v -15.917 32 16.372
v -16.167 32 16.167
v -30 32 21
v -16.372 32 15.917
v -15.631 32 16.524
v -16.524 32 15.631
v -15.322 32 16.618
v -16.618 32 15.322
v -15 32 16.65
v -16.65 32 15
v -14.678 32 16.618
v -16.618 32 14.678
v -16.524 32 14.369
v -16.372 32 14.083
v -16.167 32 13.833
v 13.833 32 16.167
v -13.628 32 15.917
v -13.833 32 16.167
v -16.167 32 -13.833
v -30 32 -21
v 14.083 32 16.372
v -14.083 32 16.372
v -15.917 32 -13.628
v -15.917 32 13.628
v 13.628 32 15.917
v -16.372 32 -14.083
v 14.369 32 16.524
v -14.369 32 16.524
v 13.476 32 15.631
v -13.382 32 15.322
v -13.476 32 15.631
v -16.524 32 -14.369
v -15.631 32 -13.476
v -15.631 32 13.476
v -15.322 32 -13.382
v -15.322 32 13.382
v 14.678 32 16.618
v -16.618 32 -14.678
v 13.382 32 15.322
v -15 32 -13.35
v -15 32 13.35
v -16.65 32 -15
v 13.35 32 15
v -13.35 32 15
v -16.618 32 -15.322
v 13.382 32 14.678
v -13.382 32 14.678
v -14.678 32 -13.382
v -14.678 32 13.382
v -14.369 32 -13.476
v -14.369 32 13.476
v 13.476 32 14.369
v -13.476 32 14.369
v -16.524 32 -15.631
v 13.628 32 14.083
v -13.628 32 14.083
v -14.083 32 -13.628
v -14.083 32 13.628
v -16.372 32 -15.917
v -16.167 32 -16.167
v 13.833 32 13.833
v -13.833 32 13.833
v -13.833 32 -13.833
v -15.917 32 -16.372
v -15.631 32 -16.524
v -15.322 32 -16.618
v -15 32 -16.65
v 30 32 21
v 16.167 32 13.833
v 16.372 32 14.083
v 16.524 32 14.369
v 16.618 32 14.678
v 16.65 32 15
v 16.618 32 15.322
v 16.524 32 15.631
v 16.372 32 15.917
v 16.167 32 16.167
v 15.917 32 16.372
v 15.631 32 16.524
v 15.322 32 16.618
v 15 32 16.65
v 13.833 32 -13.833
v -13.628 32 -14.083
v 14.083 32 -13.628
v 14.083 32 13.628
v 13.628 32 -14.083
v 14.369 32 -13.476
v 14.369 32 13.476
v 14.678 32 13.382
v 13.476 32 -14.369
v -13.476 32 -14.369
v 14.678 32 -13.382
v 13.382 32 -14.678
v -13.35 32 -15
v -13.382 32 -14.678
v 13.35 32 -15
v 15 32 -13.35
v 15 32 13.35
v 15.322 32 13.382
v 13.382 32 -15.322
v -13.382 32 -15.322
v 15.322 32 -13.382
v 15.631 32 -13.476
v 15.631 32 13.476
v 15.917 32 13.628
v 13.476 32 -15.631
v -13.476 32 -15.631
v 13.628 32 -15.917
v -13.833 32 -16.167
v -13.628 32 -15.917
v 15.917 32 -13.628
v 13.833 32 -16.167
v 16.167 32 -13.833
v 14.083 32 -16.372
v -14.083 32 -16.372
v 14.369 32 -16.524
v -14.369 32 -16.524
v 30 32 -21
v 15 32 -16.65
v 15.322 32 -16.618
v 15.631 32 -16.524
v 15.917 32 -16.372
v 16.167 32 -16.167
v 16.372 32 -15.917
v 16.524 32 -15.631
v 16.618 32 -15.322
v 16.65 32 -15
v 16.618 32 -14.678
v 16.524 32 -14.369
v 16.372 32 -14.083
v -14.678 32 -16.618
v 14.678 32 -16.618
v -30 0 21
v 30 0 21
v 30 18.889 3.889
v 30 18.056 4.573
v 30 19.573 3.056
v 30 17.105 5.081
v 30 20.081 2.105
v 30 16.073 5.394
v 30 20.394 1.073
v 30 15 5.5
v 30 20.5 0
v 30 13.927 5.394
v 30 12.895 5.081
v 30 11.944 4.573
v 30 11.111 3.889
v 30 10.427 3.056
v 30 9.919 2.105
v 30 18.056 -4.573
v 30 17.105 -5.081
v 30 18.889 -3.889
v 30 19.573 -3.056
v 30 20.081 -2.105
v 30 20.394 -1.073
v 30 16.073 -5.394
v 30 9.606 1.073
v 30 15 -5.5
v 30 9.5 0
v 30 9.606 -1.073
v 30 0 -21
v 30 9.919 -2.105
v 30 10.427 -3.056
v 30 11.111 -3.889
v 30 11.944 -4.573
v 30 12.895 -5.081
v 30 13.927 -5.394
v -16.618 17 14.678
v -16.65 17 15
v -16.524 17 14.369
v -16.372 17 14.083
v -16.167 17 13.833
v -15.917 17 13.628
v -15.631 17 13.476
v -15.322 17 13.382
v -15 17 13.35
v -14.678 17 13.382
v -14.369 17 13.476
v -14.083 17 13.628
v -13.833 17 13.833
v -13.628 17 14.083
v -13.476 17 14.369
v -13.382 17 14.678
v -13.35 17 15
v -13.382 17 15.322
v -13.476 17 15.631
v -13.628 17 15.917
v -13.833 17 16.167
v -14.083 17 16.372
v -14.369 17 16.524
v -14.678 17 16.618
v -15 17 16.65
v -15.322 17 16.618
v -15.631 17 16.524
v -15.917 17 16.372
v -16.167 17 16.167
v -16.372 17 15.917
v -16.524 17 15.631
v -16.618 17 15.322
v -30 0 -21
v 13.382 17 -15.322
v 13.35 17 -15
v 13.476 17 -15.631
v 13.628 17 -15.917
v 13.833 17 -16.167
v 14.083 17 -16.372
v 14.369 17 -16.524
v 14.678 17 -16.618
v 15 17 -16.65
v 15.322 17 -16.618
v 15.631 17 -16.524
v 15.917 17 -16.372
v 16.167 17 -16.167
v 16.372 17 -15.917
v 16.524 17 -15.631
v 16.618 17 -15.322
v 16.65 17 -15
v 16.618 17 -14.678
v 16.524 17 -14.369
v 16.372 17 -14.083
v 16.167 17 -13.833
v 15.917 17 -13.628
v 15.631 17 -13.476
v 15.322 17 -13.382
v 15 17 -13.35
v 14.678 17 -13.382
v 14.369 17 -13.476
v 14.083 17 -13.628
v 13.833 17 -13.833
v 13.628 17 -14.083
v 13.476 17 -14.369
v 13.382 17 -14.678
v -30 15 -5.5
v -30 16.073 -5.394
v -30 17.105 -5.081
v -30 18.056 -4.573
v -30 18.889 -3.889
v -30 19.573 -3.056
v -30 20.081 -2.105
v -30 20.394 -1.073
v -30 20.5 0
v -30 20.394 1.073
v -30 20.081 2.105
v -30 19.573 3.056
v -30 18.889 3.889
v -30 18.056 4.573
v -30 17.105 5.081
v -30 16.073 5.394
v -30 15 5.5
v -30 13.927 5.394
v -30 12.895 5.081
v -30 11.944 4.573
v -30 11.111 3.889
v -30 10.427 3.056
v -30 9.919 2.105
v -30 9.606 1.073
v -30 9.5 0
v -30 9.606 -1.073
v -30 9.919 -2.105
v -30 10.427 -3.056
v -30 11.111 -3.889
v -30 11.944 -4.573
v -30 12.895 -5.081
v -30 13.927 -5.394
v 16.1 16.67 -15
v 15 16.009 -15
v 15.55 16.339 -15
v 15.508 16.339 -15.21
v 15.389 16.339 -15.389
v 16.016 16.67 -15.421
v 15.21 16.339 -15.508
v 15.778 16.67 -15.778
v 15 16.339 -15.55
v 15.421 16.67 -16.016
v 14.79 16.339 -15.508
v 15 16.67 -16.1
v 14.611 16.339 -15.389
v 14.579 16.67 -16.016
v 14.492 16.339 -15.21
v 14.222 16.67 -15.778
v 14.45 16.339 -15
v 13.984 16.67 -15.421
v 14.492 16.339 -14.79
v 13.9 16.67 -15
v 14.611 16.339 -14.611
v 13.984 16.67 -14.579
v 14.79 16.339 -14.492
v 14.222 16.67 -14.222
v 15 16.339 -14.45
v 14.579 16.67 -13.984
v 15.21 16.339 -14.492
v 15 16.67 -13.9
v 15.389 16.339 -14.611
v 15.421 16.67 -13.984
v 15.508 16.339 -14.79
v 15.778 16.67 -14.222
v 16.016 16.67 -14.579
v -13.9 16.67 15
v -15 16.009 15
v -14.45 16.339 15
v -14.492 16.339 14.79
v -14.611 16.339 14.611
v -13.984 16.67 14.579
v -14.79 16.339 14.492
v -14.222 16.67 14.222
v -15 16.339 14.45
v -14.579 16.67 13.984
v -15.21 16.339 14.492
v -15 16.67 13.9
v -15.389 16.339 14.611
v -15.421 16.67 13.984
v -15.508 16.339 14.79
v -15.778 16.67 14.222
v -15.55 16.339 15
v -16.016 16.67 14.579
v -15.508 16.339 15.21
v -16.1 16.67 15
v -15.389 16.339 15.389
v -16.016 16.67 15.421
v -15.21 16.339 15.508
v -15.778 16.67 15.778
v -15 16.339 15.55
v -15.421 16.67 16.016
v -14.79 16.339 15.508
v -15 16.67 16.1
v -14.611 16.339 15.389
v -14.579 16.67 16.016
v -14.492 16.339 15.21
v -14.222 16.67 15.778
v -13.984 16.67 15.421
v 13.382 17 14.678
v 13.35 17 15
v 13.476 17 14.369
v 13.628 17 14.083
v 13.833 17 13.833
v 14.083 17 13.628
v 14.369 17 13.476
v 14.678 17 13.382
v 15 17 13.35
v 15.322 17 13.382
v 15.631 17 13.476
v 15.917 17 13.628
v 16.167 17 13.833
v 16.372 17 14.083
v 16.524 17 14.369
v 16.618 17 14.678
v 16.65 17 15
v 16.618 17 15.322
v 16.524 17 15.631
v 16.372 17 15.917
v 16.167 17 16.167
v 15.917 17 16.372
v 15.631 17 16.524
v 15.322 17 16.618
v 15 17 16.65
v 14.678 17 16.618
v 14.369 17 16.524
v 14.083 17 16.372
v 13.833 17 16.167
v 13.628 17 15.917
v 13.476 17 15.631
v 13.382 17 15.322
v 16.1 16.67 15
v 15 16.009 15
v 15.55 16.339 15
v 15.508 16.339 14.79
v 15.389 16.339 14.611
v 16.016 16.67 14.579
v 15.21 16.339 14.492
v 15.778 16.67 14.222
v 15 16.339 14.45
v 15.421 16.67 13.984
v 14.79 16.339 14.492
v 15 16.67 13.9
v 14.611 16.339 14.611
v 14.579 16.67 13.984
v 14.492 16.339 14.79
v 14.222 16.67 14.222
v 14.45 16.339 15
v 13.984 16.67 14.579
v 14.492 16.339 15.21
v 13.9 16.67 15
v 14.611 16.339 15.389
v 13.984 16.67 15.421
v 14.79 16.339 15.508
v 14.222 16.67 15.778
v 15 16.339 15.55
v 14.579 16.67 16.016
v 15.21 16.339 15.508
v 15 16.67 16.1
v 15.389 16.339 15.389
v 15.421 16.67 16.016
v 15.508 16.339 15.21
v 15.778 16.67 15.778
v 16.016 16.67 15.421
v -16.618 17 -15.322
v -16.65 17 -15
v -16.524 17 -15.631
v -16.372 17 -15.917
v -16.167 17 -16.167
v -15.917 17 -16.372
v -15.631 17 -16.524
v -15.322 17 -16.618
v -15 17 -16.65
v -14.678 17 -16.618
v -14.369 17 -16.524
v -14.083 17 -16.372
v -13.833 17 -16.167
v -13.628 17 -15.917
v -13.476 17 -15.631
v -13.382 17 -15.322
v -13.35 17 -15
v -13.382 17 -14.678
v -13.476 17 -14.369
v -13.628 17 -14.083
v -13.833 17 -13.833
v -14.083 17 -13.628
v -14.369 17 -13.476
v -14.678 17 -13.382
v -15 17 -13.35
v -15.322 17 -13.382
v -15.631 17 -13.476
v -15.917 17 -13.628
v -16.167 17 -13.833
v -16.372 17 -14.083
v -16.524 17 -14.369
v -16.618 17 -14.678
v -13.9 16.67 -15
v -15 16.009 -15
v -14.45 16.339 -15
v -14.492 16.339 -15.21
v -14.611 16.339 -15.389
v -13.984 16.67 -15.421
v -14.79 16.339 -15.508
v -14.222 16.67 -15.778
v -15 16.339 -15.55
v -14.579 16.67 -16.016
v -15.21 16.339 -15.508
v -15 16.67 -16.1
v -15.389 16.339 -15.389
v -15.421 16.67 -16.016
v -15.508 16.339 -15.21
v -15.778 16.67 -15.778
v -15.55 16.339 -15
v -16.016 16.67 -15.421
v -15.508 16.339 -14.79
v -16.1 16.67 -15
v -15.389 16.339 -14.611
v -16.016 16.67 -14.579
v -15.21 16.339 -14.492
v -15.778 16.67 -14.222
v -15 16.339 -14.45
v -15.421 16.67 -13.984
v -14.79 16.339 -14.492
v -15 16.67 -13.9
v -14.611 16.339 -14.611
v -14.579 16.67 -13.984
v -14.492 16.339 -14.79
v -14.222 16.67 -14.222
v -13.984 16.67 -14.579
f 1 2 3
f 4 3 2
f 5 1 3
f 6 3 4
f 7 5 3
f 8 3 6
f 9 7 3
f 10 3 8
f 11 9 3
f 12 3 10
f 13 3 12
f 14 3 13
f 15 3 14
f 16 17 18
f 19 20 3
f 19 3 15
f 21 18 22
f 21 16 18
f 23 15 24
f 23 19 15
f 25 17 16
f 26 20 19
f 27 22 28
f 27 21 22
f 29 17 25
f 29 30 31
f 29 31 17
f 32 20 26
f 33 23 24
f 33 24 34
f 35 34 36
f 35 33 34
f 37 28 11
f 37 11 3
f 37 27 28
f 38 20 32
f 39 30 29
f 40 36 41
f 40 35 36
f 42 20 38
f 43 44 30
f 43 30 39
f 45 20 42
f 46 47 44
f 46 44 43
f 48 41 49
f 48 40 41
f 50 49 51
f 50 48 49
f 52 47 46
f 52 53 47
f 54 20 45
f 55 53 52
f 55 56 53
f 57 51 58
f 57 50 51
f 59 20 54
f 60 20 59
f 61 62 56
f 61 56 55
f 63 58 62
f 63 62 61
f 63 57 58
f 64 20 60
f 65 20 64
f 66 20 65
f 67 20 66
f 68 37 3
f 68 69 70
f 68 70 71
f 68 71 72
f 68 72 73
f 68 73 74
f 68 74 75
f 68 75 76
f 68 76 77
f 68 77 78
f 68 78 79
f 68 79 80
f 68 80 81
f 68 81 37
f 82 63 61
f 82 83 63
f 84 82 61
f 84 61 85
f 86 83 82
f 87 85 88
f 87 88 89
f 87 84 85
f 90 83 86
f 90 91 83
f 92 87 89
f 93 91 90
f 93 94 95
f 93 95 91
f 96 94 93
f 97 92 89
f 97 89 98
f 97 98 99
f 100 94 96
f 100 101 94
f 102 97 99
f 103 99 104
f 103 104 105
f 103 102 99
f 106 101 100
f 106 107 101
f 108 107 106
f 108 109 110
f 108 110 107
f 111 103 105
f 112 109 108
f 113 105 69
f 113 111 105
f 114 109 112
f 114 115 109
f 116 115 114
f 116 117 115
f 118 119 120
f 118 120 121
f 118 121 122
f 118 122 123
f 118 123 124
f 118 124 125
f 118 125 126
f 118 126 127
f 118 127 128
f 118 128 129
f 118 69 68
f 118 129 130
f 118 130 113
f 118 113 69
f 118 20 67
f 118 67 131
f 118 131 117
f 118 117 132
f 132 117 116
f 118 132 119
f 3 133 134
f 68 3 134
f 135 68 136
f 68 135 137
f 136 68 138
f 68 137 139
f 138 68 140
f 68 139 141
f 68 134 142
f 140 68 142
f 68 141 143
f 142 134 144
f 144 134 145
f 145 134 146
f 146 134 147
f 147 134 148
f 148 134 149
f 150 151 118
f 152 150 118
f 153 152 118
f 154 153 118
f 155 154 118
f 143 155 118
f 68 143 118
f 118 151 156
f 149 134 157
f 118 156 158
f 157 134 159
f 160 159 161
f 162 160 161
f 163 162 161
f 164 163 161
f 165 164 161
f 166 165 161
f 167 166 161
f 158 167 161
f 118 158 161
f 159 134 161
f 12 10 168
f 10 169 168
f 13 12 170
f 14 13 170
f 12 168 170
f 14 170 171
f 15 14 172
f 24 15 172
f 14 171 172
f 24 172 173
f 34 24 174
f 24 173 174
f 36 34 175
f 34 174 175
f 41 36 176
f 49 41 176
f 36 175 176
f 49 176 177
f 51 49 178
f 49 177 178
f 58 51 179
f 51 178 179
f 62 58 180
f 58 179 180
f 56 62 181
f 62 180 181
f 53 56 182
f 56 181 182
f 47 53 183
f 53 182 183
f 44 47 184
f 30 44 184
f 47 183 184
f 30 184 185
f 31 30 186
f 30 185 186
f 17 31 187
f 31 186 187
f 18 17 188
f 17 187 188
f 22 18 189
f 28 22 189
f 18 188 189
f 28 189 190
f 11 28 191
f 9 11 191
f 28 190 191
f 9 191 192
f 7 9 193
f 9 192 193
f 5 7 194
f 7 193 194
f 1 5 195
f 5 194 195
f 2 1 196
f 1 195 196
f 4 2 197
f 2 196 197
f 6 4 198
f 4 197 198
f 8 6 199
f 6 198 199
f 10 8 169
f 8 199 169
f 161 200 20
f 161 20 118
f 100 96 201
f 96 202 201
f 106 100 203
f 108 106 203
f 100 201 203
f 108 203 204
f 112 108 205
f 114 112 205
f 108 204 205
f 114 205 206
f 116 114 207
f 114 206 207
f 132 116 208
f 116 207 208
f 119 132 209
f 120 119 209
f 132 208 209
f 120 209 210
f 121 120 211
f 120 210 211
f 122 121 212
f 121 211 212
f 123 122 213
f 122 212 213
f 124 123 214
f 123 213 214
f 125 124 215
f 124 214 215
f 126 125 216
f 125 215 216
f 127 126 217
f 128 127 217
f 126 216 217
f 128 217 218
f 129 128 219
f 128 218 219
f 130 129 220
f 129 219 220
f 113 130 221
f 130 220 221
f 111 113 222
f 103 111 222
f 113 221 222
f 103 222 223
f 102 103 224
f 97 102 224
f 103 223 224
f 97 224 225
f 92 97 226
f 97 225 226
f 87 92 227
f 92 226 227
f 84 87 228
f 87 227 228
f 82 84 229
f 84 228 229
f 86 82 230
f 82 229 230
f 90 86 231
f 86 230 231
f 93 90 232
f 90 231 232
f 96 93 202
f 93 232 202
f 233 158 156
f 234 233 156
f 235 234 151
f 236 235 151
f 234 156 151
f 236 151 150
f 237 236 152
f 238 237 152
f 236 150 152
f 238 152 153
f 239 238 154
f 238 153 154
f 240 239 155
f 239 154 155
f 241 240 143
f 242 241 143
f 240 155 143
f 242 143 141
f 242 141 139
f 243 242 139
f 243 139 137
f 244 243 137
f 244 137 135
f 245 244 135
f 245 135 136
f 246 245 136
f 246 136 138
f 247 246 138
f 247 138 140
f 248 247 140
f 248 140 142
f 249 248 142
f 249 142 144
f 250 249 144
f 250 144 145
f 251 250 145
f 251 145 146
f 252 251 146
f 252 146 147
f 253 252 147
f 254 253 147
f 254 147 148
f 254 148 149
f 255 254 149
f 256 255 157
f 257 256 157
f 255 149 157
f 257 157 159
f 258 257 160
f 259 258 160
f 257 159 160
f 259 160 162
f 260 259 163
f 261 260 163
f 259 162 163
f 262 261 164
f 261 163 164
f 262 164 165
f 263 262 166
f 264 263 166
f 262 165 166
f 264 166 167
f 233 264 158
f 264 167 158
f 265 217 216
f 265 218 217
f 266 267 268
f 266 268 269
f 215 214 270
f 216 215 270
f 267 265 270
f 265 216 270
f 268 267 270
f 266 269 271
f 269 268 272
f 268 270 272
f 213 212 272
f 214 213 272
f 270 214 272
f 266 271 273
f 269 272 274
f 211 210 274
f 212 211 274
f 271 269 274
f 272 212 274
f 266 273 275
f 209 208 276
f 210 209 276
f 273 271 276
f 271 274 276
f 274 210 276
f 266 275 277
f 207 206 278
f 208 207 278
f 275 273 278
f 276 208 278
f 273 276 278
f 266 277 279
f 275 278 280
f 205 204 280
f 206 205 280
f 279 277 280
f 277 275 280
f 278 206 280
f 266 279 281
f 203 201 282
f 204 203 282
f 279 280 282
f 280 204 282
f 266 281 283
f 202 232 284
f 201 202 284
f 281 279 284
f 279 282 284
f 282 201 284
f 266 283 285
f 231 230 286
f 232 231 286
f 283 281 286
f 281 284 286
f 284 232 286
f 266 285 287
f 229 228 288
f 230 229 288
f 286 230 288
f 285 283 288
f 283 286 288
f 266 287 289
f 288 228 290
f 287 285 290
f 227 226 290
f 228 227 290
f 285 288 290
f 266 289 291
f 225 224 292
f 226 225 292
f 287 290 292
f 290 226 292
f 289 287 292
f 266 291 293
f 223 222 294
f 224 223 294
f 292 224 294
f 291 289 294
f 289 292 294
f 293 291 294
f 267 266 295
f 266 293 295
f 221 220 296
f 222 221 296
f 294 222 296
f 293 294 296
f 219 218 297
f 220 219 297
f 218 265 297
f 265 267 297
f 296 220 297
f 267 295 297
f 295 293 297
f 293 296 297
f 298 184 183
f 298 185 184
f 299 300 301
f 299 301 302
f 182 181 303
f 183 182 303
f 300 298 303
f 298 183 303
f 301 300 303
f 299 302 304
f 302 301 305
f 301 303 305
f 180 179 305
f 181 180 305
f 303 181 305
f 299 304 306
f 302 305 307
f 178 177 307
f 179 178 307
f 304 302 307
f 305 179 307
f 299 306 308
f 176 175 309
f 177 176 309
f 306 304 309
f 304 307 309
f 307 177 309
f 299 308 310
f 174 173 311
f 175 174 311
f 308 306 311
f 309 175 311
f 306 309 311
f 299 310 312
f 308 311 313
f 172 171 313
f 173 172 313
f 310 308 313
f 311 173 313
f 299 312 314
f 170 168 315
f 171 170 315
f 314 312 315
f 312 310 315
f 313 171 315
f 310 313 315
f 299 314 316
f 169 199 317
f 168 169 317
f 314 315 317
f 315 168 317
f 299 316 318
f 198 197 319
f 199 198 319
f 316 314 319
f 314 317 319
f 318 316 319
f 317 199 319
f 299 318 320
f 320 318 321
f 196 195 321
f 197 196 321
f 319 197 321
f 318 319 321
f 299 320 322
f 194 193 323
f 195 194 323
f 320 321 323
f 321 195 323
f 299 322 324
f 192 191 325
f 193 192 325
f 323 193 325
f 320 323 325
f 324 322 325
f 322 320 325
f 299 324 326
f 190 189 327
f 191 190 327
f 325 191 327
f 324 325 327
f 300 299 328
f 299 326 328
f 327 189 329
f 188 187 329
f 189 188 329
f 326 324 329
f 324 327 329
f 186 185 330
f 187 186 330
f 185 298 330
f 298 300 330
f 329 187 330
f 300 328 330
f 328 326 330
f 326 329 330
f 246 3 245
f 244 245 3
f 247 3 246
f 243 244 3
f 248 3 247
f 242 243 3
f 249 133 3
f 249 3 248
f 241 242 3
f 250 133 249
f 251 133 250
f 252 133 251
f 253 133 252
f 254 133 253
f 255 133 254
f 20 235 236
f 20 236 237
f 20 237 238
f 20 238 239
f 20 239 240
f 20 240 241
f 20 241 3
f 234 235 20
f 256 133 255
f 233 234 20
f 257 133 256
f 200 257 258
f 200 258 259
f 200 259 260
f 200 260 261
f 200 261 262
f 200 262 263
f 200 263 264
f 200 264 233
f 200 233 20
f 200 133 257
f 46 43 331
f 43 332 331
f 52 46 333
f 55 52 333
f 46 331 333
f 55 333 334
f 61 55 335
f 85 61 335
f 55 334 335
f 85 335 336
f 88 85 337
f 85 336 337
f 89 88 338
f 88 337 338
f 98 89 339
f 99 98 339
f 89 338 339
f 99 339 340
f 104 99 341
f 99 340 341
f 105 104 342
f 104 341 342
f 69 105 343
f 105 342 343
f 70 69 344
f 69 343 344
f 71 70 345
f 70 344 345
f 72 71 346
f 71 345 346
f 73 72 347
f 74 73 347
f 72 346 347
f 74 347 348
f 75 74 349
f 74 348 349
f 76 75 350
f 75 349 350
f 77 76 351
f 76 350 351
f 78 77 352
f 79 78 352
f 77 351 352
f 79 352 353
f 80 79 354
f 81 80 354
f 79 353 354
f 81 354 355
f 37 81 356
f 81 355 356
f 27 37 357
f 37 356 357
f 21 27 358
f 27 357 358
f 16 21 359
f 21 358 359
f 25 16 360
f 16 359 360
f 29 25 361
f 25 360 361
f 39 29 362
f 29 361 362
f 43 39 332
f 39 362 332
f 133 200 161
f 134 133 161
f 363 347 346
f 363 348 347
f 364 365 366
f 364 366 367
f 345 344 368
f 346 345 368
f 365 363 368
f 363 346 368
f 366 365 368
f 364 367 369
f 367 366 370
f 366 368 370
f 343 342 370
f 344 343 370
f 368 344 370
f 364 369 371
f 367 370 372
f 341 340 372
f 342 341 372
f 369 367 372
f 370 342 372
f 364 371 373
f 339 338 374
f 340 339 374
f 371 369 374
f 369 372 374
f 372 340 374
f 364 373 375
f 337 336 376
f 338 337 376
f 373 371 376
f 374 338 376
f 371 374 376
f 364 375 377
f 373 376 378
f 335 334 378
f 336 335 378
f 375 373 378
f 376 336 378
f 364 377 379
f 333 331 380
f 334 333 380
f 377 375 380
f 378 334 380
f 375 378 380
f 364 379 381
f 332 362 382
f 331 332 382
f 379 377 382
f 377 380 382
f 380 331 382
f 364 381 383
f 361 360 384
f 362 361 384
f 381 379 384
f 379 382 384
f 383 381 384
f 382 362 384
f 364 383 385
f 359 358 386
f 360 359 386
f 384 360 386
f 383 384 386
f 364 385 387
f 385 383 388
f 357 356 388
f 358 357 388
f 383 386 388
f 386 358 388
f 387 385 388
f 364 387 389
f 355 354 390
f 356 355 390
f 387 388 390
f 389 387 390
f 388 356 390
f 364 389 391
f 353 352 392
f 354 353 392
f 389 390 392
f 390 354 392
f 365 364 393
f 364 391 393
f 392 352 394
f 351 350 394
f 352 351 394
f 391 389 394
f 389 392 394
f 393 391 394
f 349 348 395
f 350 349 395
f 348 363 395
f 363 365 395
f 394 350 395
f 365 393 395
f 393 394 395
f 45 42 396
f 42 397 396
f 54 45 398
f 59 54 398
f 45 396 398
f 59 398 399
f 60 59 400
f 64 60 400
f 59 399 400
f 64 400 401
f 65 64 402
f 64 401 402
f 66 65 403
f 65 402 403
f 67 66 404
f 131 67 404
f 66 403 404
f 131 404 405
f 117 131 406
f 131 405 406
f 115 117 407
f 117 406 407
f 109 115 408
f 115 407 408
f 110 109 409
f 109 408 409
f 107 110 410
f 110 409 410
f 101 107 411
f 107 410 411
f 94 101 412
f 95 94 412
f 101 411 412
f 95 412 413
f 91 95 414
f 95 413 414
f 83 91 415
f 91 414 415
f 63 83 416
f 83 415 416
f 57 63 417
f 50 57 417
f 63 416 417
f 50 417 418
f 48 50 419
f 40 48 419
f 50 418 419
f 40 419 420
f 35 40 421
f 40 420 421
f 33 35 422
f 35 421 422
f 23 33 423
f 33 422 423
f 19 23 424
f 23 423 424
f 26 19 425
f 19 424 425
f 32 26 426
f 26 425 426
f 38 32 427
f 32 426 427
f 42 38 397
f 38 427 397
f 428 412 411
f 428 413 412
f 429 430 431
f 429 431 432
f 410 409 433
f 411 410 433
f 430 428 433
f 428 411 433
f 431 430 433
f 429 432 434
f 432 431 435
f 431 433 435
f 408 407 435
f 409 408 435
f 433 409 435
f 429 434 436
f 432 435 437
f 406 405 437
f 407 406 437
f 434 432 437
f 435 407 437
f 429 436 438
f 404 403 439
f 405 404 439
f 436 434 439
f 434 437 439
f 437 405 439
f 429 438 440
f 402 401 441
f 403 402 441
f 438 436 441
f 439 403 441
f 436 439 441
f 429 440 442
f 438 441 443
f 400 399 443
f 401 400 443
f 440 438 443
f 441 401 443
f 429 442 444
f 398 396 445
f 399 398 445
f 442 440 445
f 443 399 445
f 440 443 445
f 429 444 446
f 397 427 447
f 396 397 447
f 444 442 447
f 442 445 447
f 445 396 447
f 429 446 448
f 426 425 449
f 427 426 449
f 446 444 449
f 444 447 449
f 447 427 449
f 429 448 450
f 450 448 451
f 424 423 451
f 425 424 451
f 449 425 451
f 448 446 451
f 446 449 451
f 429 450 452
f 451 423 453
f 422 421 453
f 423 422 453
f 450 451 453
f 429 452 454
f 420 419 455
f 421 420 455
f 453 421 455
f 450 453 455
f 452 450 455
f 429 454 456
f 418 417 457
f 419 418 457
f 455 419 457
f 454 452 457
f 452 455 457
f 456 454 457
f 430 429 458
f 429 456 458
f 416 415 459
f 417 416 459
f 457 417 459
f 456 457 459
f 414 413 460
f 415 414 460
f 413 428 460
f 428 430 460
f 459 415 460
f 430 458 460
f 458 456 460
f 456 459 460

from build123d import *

# Parameters (mm, degrees)
SKETCH1_W                 = 60
SKETCH1_H                 = 42
BOSS_EXTRUDE1_DEPTH       = 32
M4X0_7_TAPPED_HOLE1_D     = 3.3
M4X0_7_TAPPED_HOLE1_DEPTH = 15
M4X0_7_TAPPED_HOLE1_TIP   = 0.991420021
SKETCH4_R                 = 5.5
CUT_EXTRUDE1_DEPTH        = 72.168813395


with BuildPart() as part:
    # Sketch1 → Boss-Extrude1 (new body)
    with BuildSketch(Plane(origin=(0, 0, 0), x_dir=(1, 0, 0), z_dir=(0, 1, 0))):
        Rectangle(SKETCH1_W, SKETCH1_H)
    extrude(amount=BOSS_EXTRUDE1_DEPTH)

    # M4x0.7 Tapped Hole1
    with Locations(Plane(origin=(0, 32, 0), x_dir=(1, 0, 0), z_dir=(0, 1, 0))):
        with Locations((15, 15), (-15, 15), (-15, -15), (15, -15)):
            Hole(M4X0_7_TAPPED_HOLE1_D / 2, depth=M4X0_7_TAPPED_HOLE1_DEPTH)
            with Locations((0, 0, -(M4X0_7_TAPPED_HOLE1_DEPTH + M4X0_7_TAPPED_HOLE1_TIP / 2))):  # 118° drill point
                Cone(0, M4X0_7_TAPPED_HOLE1_D / 2, M4X0_7_TAPPED_HOLE1_TIP, mode=Mode.SUBTRACT)

    # Sketch4 → Cut-Extrude1 (cut, through all)
    with BuildSketch(Plane(origin=(30, 0, 0), x_dir=(0, 0, -1), z_dir=(1, 0, 0))):
        with Locations((0, 15)):
            Circle(SKETCH4_R)
    extrude(amount=-CUT_EXTRUDE1_DEPTH, mode=Mode.SUBTRACT)


solid = part.part
